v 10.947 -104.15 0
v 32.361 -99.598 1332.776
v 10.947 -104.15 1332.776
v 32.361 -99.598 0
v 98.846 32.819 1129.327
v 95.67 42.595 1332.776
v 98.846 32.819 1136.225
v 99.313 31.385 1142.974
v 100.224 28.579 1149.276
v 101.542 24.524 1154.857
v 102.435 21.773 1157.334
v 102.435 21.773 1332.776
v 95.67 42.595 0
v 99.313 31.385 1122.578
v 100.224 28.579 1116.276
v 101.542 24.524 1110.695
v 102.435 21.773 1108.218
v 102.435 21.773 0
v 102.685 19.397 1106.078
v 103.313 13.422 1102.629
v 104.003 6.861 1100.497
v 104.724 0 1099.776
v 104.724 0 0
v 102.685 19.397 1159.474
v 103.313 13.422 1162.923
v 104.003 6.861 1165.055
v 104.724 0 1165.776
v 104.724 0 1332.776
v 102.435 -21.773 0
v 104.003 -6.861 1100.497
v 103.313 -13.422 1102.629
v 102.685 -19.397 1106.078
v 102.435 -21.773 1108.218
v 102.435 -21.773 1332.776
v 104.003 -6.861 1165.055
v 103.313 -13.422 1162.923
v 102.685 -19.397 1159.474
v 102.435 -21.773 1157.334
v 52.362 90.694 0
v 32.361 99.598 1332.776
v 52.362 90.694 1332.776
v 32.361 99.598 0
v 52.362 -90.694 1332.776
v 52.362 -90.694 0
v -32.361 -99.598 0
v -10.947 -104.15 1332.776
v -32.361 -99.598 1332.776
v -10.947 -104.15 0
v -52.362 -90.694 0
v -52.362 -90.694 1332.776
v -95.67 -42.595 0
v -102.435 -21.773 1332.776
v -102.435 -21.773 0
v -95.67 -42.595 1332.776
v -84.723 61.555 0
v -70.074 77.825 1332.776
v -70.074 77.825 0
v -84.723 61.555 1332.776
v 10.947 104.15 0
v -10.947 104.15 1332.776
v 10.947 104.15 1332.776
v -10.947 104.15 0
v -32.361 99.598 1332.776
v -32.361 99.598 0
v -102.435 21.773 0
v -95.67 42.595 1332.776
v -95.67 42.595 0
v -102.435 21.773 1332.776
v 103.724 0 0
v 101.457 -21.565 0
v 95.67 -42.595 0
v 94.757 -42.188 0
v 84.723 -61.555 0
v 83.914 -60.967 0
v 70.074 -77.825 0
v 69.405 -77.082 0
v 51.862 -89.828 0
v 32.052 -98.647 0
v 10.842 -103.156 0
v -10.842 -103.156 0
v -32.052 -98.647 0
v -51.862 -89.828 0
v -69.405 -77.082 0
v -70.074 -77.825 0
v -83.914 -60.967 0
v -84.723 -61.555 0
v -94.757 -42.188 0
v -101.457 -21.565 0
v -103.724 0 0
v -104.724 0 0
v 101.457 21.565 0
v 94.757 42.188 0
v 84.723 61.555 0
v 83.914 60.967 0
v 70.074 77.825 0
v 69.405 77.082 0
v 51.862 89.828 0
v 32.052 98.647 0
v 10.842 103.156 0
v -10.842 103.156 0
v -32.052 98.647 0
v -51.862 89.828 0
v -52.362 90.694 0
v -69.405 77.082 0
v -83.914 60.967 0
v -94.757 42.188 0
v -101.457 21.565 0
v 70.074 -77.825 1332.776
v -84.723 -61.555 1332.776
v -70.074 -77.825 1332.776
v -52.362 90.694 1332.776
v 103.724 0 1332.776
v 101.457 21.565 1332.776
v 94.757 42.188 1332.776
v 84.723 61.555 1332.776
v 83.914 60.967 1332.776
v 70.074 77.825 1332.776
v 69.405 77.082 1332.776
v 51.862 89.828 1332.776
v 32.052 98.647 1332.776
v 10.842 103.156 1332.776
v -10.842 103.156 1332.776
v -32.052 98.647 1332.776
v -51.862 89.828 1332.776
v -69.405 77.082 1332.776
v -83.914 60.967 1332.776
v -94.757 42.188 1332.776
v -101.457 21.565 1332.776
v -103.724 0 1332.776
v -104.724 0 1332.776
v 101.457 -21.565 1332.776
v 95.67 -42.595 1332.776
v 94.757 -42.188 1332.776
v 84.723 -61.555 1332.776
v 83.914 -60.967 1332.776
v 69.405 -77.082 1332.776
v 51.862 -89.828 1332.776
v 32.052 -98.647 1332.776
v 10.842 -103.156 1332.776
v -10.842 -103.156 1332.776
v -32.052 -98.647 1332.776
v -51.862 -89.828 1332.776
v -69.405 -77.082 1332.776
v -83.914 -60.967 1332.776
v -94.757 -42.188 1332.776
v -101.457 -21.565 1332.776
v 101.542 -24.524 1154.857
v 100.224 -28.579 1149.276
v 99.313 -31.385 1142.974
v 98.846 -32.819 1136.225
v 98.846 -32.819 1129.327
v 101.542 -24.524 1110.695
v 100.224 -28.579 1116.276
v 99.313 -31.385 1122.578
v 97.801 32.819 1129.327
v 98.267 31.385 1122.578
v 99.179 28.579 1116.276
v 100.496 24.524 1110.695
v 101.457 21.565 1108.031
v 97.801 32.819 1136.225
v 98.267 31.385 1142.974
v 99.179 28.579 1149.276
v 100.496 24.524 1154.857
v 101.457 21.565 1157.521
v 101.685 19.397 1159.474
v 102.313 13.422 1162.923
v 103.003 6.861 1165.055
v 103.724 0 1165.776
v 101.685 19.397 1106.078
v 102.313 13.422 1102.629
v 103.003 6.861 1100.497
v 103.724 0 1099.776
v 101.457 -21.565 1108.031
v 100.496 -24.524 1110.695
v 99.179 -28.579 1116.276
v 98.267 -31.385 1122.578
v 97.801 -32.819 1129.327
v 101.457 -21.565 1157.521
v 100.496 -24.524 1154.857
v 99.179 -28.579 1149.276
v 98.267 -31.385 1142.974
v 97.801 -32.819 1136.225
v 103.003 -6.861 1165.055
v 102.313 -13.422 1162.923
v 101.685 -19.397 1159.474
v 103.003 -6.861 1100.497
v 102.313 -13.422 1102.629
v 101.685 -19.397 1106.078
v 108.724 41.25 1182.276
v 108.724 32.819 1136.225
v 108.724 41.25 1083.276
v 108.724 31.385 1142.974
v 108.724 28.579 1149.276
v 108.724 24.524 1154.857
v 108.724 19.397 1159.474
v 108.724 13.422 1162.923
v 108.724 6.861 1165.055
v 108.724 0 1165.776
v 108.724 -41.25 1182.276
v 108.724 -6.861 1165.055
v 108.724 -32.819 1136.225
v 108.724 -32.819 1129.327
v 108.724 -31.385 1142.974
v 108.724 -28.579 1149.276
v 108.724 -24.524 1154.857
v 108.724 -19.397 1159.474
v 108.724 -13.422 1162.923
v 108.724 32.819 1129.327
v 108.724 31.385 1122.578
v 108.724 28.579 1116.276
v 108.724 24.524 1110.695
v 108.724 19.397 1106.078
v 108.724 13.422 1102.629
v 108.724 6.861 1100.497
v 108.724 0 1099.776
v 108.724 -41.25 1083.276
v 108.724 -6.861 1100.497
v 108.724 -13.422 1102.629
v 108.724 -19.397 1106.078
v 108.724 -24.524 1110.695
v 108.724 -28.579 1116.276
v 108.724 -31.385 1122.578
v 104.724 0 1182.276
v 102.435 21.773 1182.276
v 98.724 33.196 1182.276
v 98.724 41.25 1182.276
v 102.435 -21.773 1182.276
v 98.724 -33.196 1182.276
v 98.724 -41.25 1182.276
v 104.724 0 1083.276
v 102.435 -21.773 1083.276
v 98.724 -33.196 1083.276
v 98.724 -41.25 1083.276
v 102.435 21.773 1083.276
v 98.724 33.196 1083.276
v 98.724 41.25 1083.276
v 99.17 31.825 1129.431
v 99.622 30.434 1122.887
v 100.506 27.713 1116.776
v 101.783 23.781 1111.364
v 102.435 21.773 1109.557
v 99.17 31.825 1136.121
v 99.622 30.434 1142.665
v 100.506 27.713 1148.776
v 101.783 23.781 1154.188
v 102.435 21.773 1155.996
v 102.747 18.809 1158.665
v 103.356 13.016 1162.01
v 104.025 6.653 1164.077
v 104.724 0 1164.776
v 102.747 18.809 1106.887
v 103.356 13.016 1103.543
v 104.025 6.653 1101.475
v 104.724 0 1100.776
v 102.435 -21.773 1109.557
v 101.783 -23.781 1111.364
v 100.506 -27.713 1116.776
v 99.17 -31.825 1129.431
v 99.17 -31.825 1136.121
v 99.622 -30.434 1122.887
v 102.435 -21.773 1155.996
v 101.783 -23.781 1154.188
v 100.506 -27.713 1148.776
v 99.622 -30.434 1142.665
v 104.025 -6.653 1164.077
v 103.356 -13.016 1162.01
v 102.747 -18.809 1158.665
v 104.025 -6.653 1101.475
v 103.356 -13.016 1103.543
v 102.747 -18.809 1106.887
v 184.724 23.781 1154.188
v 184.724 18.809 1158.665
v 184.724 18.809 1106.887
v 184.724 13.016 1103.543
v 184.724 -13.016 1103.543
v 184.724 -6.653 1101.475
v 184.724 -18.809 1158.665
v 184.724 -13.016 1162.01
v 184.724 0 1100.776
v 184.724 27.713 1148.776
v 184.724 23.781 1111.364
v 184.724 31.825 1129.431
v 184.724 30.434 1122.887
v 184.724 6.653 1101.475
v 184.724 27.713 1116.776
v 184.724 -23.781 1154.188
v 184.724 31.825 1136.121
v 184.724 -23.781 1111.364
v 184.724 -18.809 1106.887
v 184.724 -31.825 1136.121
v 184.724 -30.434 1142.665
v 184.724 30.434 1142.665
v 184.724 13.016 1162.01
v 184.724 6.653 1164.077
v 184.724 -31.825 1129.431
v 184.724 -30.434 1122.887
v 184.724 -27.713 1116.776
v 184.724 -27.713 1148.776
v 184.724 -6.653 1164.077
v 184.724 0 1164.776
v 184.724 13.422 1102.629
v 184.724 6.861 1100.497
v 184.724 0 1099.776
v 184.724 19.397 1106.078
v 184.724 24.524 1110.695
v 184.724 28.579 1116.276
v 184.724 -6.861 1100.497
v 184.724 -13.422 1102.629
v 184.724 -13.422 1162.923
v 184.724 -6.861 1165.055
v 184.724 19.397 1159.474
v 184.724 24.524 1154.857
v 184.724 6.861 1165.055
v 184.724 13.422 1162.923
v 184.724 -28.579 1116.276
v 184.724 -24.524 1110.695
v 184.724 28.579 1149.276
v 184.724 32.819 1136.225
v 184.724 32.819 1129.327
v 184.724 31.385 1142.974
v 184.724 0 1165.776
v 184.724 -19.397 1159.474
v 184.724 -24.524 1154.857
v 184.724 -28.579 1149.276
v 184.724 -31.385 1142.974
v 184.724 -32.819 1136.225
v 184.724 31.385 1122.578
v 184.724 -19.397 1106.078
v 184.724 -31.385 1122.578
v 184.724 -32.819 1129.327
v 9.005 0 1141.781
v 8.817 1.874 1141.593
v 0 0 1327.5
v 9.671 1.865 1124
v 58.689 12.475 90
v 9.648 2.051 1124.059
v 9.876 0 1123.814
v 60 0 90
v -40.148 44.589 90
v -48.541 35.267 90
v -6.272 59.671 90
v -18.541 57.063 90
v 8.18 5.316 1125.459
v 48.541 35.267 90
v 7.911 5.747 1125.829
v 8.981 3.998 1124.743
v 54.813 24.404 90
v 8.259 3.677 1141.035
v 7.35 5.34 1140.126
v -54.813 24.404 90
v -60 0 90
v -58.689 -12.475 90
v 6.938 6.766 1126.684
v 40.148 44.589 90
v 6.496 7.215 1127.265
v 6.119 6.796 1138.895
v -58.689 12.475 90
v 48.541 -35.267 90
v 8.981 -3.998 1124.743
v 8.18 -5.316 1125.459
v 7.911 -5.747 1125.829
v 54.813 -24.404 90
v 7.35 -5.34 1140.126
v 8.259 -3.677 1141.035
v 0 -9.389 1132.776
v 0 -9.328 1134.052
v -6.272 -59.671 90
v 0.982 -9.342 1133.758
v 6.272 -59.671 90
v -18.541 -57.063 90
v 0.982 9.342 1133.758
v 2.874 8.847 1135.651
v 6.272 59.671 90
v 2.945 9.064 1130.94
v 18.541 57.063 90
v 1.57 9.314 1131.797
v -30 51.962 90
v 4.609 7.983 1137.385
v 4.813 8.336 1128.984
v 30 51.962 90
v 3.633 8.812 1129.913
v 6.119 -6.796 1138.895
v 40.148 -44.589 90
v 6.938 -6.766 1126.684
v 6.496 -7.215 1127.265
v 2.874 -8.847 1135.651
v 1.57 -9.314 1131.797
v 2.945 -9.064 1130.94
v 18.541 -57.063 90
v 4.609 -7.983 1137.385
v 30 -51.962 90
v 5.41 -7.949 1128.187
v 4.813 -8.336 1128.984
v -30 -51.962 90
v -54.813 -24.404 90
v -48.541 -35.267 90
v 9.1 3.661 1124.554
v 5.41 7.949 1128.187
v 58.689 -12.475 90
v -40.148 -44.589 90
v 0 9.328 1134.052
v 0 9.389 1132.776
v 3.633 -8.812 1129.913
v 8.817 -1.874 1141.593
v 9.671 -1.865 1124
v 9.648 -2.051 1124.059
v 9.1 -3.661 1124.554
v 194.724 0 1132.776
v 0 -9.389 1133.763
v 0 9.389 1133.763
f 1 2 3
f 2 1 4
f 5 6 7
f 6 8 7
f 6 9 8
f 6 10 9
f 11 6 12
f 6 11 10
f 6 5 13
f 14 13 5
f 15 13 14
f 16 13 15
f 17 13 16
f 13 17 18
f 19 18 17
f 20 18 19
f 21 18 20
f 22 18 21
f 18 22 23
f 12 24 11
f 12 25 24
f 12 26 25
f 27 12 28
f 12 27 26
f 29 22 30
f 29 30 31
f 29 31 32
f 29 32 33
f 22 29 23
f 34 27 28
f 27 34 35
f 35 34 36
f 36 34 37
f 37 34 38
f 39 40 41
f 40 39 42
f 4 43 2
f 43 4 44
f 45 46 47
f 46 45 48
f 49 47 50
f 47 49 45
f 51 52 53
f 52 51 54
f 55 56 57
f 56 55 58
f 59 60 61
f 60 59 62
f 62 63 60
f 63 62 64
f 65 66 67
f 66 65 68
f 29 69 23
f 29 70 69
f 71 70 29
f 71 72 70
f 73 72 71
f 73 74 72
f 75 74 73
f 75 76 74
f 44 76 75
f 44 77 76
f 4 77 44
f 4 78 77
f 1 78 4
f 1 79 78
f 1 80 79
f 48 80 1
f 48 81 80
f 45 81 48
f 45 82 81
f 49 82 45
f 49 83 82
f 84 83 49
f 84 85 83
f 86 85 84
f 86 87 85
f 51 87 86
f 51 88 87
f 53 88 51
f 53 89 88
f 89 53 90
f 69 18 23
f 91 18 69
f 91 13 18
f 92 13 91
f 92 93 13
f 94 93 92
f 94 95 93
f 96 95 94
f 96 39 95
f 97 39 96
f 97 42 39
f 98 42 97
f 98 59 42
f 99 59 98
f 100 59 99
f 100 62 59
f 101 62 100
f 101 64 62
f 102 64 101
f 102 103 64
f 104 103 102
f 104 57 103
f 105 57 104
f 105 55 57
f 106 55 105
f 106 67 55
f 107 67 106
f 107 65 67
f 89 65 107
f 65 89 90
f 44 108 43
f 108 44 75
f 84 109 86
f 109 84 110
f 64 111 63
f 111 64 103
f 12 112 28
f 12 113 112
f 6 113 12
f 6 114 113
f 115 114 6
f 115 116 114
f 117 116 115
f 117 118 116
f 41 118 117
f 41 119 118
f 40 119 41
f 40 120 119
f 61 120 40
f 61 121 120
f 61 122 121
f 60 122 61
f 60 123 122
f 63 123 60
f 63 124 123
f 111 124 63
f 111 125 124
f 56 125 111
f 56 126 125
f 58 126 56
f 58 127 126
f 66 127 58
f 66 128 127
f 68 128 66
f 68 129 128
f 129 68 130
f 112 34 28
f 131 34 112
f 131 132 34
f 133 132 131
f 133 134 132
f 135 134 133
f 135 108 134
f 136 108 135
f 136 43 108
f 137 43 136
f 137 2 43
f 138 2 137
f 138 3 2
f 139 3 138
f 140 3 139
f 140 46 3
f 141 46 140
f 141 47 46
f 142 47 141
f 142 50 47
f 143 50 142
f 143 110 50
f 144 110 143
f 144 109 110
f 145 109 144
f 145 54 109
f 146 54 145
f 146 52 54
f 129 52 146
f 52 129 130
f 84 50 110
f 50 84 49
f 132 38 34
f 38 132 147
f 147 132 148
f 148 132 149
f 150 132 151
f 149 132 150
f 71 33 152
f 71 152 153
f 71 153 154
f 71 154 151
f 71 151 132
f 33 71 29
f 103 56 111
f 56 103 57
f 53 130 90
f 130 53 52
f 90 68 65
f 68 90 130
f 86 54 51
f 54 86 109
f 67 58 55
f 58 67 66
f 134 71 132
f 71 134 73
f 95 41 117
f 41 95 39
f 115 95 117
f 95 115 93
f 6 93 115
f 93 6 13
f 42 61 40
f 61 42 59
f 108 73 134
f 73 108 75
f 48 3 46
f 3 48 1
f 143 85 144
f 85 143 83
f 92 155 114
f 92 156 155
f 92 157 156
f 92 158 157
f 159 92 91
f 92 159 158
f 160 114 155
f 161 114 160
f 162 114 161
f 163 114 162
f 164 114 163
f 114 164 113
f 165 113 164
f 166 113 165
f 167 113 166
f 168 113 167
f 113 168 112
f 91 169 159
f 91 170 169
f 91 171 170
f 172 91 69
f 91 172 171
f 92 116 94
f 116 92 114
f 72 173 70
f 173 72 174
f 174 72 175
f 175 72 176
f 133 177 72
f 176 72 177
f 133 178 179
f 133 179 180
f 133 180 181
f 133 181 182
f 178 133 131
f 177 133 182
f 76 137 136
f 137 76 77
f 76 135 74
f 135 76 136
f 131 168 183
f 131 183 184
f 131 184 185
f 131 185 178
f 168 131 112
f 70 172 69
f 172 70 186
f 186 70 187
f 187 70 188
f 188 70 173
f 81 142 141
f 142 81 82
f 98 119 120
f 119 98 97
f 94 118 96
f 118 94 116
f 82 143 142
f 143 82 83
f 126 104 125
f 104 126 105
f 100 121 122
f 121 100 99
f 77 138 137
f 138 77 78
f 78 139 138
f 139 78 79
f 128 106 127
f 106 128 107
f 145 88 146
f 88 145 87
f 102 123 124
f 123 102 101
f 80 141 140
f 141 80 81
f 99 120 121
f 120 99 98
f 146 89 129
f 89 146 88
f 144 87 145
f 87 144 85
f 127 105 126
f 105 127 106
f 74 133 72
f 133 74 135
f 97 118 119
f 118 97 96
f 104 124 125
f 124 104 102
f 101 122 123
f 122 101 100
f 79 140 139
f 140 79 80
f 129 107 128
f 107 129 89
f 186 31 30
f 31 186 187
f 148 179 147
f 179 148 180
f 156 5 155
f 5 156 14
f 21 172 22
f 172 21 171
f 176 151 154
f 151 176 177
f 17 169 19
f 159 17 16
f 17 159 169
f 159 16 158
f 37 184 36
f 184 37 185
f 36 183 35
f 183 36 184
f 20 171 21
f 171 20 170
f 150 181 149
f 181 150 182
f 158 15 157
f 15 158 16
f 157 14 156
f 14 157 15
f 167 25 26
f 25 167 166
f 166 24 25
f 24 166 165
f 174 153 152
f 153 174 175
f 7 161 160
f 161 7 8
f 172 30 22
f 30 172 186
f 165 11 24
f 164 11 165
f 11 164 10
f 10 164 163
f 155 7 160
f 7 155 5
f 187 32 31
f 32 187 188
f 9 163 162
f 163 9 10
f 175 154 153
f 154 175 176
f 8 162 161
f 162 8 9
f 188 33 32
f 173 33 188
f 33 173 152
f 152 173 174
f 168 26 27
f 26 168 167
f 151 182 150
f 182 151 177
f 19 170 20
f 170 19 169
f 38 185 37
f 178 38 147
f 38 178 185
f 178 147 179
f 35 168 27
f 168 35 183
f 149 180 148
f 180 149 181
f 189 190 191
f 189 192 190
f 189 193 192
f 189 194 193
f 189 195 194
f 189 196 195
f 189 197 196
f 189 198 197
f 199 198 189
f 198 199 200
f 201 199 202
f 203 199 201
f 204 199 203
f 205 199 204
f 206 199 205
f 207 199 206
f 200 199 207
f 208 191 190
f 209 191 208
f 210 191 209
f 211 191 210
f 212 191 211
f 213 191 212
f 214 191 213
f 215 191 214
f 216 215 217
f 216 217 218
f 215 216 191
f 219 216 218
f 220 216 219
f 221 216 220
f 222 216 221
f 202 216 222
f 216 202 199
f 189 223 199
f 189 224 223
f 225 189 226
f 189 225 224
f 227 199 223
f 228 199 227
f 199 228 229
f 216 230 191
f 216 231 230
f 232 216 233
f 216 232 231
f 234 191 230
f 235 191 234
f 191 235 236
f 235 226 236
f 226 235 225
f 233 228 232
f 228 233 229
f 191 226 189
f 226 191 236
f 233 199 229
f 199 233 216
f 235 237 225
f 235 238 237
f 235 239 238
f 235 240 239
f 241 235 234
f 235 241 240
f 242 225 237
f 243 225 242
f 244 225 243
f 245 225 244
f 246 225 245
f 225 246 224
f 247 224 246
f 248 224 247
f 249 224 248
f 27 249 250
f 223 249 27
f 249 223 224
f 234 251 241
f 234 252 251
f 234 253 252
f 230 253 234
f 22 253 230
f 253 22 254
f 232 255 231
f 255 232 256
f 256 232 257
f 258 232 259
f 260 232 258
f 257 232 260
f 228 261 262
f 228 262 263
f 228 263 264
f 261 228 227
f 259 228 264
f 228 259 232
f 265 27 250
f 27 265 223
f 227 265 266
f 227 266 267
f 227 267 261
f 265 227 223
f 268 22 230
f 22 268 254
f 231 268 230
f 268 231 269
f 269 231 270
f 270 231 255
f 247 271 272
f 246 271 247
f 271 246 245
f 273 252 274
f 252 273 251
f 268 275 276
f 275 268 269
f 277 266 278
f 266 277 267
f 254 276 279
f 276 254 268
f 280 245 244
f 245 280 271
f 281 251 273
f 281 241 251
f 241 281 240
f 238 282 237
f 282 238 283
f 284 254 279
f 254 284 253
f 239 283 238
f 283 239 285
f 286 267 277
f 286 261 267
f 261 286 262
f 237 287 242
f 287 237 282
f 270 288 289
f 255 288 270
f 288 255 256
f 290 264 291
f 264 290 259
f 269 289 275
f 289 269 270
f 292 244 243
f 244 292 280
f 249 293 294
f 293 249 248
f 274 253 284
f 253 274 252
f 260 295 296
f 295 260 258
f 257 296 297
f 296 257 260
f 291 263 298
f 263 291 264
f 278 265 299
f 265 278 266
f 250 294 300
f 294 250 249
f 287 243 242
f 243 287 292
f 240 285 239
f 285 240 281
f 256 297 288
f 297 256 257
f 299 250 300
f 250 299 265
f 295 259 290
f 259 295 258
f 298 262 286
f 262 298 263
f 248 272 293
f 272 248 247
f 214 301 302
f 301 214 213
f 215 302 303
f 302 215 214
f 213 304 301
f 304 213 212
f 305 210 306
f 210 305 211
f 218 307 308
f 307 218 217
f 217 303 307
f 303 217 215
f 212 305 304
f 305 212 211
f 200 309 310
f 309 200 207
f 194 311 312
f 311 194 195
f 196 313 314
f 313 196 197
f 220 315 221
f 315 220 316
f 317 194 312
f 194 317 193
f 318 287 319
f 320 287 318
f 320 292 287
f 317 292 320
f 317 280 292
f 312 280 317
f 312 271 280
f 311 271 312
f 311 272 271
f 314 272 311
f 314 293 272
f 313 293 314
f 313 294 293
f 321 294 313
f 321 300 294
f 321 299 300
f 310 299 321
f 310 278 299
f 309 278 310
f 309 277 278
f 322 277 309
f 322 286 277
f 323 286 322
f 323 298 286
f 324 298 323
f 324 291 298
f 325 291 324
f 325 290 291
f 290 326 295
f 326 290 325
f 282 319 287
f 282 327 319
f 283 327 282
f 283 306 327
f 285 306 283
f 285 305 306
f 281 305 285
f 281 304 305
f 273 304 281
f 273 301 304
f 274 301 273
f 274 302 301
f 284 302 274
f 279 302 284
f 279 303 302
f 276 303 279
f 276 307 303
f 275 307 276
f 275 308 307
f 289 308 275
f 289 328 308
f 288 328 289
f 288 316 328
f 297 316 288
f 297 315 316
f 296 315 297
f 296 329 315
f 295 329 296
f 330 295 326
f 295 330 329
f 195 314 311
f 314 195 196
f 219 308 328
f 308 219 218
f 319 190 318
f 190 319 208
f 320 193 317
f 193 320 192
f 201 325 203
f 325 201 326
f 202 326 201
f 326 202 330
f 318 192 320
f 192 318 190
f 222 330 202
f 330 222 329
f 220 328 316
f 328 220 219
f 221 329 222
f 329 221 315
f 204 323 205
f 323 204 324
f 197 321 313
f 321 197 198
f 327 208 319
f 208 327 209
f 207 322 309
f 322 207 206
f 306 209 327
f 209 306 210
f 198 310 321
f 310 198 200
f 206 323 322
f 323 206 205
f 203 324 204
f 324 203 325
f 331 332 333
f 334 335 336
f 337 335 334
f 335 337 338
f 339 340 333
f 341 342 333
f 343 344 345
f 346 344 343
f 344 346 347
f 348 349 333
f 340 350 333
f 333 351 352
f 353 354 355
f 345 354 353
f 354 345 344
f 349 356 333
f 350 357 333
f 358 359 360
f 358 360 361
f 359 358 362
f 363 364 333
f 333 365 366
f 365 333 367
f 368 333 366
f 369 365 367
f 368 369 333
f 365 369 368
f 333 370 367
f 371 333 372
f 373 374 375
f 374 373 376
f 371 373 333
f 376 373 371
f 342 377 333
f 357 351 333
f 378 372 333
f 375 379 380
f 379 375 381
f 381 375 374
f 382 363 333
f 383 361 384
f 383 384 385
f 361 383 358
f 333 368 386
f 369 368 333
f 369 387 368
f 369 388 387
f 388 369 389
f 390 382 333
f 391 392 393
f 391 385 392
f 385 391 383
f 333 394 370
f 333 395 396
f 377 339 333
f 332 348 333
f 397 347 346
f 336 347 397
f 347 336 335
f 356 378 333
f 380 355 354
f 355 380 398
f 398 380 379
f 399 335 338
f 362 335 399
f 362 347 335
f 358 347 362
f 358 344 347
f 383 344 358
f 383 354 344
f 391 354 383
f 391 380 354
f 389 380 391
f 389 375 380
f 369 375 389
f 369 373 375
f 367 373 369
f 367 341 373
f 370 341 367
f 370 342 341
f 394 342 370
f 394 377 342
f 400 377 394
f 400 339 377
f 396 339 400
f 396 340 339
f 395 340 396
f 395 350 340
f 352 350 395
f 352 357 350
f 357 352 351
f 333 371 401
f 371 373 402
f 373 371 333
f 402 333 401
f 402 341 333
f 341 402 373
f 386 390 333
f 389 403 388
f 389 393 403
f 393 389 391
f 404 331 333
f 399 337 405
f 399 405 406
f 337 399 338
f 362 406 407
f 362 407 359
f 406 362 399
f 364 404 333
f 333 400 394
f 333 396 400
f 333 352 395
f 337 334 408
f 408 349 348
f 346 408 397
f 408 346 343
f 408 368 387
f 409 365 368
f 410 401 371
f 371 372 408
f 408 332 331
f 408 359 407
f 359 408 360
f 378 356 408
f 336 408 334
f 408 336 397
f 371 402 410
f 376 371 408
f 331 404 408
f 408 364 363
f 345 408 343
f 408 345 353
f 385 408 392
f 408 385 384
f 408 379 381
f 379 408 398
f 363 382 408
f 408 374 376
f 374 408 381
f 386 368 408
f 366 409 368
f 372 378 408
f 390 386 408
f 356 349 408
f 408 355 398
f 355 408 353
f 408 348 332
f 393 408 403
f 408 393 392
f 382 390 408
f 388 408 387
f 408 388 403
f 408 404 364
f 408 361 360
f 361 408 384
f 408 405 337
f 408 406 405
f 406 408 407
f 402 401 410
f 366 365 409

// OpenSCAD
/****************
Armado del TELESCOPIO
Asociación Amigos de la Astronomía
Dimensionamiento según apunte de Teoría de construccion de telescopios.
Copy Left.
twitter@juanmiguells
****************/

// Todas las medidas son en milímietros
// Valores que se obtienen de las partes fabricadas MODIFICAR SEGUN CORRSPONDA

// Datos Espejo
DistanciaFocal = 1237.5; // Distancia Focal "F" se obtiene con el Foucault
DiametroEspejoPrimario = 120; // Diámetro del espejo Primario se obtiene midiendo el espejo
// Datos Constructivos
ValorA = 100; // Valor "A" no tiene real importancia A = 100 / 150 
ValorB = 100; // Valor "B" Desde el punto de fijación de la araña hasta el centro del espejo secundario con el tornillo central de la araña al %50
ValorC = 50; // Valor "C" Desde el punto de fijación de la celda hasta el borde del espejo primario
ValorD = 40; // Valor "D" para que los tornillos de la celda no sobresalgan del tubo.
ValorE = 90; // Valor "E" es la distancia entre la base del enfocador hasta la parte superior de su tubo porta ocular cuando este se encuentra a la mitad de su recorrido de enfoque. 
// Medidas del Tubo
PerimetroExteriorDelTubo = 658; // Perímetro exterior del tubo
EspesorDeLaParedDelTubo = 1;
// Medidas de PortaOcular
LargoDelPortaOcular = 80; 
RadioDelPortaOcular = 33;
EspesorDeLaParedDelPO = 1; // Espesor de la pared del Tubo es la medida del ancho del material del tubo


/**********************************************/
/* NO MODIFICAR NADA DEBAJO DE ESTE COMENTARIO*/
/* NO MODIFICAR NADA DEBAJO DE ESTE COMENTARIO*/
/* NO MODIFICAR NADA DEBAJO DE ESTE COMENTARIO*/
/* NO MODIFICAR NADA DEBAJO DE ESTE COMENTARIO*/
/* NO MODIFICAR NADA DEBAJO DE ESTE COMENTARIO*/
/* NO MODIFICAR NADA DEBAJO DE ESTE COMENTARIO*/
/**********************************************/

/************************/
/* Datos de los ESPEJOS */
/************************/

// PRIMARIO
F = DistanciaFocal;
DeP = DiametroEspejoPrimario; 
ReP = DeP / 2;  // Radio Espejo Primario "ReP"

// SECUNDARIO

/******************/
/* Datos del TUBO */
/******************/

Et = EspesorDeLaParedDelTubo;
Pt = PerimetroExteriorDelTubo; 
Dt = Pt / 3.14159265359; // Diámetro exterior del Tubo
Rt = Dt / 2; // Radio exterio del tubo "Rt" Diametro Sobre 2

A = ValorA;
B = ValorB; 
C = ValorC; 
D = ValorD; 
E = ValorE; 

// Con "F", "Rt" y "E" podemos calcular "S" que es la separación entre ambos espejos.
S = F - Rt - E;

// Largo Total del Tubo "Lt" = "A" + "B" + "C" + "D" + "S"
Lt = A + B + C + D + S;

/******************/
/* Datos del PORTA OCULAR */
/******************/

LargoPO = LargoDelPortaOcular;
RPO = RadioDelPortaOcular;
EPO = EspesorDeLaParedDelPO;

/************/
/* CALCULOS */
/************/
alfa = atan(ReP / F); // Cálculo del ángulo "alfa" que forma la altura del cono de luz con el borde "Tangente(alfa)" = altura del cono sobre el radio del espejo Entonces arco tangente de alfa me da alfa.
RbS = tan(alfa) * (F - S); // Cáculo del radio de la base del cono de luz que se proyecta desde el espejo Secundario





// Cono de Luz
module conoDeLuz (DistanciaFocal, RadioEspejoPrimario){
// Traslación correspondiente al espacio que ocupa la celda y el espacio debajo de la celda
translate ([0,0, C + D])
color ("PaleTurquoise")
cylinder
(DistanciaFocal
,RadioEspejoPrimario
,0
,center = false);
}

// Cono de Luz Con espejo Secundario
module conoDeLuzSecundario (DistanciaFocal, BaseSecundario){
// Traslación correspondiente a la Separación entre los espejos.
    translate ([0,0, C + D + S])
        rotate ([0,90,0]){
        color ("white")
        cylinder
        (DistanciaFocal - S
        ,BaseSecundario
        ,0
        ,center = false);
    }
}

/********/
/* TUBO */
/********/

module cilindroTubo (){
    color ("MediumSlateBlue")
    cylinder
    (Lt
    ,Rt
    ,Rt
    ,center = false);
}

module cilindroInteriorTubo (){
    color ("black")
    cylinder
    (Lt + Et*2
    ,(Rt - Et)
    ,(Rt - Et)
    ,center = false);
}


module tubo (){
    difference () {
        cilindroTubo();
        translate ([0,0, -Et]) 
            cilindroInteriorTubo();
            // Orificio Porta Ocular
       translate ([Rt -10, 0 ,C + D + S]) 
           rotate ([0,90,0]){
            cylinder
                (LargoPO
                ,RPO
                ,RPO
                ,center = false
                );
           }
    }   
}


module portaOcular()
{
    
    translate ([Rt - Et, 0 ,C + D + S])
        difference() {
            cube([10, (RPO * 2.5), (RPO * 3)], true);
            translate ([-Rt + Et, 0 , -S])
                cilindroTubo();
            rotate ([0,90,0]){
                cylinder
                (LargoPO + EPO*2
                ,RPO - EPO
                ,RPO - EPO
                ,center = true
                );            
            }
        }
    translate ([Rt, 0 ,C + D + S])
        rotate ([0,90,0]){
            difference() {
                cylinder
                (LargoPO
                ,RPO
                ,RPO
                ,center = false
                );
                translate ([0,0, -EPO]) 
                cylinder
                (LargoPO + EPO*2
                ,RPO - EPO
                ,RPO - EPO
                ,center = false
                );            
            }
        }
}

module textos(tamFuente)
{
    oraciones=["TELESCOPIO"
        ,str("Distancia Focal F = ", F , "mm")
        ,str("Distancia S = ", S , "mm")
        ,str("Distancia S + D Desde las fijaciones de la celda al centro del Porta Ocular = ", S+D , "mm")
        ,str("Distancia D de la base del Tubo a las fijaciones de la celda = ", D , "mm" )
        ,str("Distancia C de las fijaciones de la Celda al Borde del Espejo Primario = ", C , "mm" )
        ,str("Distancia B de la fijación de la araña al centro del Espejo Secundario = ", B , "mm" )
        ,str("Distancia A es arbitraria entre 100 y 150 = ", A , "mm" )
    ];
    for(a = [0:len(oraciones)-1])
    {
        translate([0, Dt, Lt - (tamFuente*1.5)*a])
        rotate([90,0,90]){
        color("black"){
            text(str(oraciones[a]), tamFuente);
        }    
    }
        
        }
    
 }



// Render Comentar o descomentar las funciones para ver piezas

tubo(Rt, Lt, Et);
portaOcular();
conoDeLuz(F, ReP);
conoDeLuzSecundario(F, RbS);
textos(10);
